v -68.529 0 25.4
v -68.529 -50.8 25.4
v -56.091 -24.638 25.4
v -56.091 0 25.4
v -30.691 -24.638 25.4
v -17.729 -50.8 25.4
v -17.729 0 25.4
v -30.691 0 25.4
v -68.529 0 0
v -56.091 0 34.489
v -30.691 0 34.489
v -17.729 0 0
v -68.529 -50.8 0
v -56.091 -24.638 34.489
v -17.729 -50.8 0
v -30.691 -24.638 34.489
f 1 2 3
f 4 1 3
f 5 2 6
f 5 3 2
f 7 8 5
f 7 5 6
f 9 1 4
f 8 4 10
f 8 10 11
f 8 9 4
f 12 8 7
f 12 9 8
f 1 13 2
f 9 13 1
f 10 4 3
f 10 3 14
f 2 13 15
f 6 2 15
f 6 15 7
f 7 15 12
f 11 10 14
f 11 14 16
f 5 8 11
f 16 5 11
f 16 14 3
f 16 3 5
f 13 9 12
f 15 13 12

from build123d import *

# Parameters (mm, degrees)
F0_W     = 25.4
F0_H     = 25.4
F1_DEPTH = 24.638
F2_W     = 50.8
F2_H     = 50.8
F3_DEPTH = 25.4


with BuildPart() as f1:
    # F0 (on Front) → F1 (new body)
    with BuildSketch(Plane.XZ):
        with Locations((-43.39072, 21.789327)):
            Rectangle(F0_W, F0_H)
    extrude(amount=F1_DEPTH)

    # F2 (on Top) → F3 (join)
    with BuildSketch(Plane.XY):
        with Locations((-43.128742, -25.4)):
            Rectangle(F2_W, F2_H)
    extrude(amount=F3_DEPTH)


solid = f1.part
